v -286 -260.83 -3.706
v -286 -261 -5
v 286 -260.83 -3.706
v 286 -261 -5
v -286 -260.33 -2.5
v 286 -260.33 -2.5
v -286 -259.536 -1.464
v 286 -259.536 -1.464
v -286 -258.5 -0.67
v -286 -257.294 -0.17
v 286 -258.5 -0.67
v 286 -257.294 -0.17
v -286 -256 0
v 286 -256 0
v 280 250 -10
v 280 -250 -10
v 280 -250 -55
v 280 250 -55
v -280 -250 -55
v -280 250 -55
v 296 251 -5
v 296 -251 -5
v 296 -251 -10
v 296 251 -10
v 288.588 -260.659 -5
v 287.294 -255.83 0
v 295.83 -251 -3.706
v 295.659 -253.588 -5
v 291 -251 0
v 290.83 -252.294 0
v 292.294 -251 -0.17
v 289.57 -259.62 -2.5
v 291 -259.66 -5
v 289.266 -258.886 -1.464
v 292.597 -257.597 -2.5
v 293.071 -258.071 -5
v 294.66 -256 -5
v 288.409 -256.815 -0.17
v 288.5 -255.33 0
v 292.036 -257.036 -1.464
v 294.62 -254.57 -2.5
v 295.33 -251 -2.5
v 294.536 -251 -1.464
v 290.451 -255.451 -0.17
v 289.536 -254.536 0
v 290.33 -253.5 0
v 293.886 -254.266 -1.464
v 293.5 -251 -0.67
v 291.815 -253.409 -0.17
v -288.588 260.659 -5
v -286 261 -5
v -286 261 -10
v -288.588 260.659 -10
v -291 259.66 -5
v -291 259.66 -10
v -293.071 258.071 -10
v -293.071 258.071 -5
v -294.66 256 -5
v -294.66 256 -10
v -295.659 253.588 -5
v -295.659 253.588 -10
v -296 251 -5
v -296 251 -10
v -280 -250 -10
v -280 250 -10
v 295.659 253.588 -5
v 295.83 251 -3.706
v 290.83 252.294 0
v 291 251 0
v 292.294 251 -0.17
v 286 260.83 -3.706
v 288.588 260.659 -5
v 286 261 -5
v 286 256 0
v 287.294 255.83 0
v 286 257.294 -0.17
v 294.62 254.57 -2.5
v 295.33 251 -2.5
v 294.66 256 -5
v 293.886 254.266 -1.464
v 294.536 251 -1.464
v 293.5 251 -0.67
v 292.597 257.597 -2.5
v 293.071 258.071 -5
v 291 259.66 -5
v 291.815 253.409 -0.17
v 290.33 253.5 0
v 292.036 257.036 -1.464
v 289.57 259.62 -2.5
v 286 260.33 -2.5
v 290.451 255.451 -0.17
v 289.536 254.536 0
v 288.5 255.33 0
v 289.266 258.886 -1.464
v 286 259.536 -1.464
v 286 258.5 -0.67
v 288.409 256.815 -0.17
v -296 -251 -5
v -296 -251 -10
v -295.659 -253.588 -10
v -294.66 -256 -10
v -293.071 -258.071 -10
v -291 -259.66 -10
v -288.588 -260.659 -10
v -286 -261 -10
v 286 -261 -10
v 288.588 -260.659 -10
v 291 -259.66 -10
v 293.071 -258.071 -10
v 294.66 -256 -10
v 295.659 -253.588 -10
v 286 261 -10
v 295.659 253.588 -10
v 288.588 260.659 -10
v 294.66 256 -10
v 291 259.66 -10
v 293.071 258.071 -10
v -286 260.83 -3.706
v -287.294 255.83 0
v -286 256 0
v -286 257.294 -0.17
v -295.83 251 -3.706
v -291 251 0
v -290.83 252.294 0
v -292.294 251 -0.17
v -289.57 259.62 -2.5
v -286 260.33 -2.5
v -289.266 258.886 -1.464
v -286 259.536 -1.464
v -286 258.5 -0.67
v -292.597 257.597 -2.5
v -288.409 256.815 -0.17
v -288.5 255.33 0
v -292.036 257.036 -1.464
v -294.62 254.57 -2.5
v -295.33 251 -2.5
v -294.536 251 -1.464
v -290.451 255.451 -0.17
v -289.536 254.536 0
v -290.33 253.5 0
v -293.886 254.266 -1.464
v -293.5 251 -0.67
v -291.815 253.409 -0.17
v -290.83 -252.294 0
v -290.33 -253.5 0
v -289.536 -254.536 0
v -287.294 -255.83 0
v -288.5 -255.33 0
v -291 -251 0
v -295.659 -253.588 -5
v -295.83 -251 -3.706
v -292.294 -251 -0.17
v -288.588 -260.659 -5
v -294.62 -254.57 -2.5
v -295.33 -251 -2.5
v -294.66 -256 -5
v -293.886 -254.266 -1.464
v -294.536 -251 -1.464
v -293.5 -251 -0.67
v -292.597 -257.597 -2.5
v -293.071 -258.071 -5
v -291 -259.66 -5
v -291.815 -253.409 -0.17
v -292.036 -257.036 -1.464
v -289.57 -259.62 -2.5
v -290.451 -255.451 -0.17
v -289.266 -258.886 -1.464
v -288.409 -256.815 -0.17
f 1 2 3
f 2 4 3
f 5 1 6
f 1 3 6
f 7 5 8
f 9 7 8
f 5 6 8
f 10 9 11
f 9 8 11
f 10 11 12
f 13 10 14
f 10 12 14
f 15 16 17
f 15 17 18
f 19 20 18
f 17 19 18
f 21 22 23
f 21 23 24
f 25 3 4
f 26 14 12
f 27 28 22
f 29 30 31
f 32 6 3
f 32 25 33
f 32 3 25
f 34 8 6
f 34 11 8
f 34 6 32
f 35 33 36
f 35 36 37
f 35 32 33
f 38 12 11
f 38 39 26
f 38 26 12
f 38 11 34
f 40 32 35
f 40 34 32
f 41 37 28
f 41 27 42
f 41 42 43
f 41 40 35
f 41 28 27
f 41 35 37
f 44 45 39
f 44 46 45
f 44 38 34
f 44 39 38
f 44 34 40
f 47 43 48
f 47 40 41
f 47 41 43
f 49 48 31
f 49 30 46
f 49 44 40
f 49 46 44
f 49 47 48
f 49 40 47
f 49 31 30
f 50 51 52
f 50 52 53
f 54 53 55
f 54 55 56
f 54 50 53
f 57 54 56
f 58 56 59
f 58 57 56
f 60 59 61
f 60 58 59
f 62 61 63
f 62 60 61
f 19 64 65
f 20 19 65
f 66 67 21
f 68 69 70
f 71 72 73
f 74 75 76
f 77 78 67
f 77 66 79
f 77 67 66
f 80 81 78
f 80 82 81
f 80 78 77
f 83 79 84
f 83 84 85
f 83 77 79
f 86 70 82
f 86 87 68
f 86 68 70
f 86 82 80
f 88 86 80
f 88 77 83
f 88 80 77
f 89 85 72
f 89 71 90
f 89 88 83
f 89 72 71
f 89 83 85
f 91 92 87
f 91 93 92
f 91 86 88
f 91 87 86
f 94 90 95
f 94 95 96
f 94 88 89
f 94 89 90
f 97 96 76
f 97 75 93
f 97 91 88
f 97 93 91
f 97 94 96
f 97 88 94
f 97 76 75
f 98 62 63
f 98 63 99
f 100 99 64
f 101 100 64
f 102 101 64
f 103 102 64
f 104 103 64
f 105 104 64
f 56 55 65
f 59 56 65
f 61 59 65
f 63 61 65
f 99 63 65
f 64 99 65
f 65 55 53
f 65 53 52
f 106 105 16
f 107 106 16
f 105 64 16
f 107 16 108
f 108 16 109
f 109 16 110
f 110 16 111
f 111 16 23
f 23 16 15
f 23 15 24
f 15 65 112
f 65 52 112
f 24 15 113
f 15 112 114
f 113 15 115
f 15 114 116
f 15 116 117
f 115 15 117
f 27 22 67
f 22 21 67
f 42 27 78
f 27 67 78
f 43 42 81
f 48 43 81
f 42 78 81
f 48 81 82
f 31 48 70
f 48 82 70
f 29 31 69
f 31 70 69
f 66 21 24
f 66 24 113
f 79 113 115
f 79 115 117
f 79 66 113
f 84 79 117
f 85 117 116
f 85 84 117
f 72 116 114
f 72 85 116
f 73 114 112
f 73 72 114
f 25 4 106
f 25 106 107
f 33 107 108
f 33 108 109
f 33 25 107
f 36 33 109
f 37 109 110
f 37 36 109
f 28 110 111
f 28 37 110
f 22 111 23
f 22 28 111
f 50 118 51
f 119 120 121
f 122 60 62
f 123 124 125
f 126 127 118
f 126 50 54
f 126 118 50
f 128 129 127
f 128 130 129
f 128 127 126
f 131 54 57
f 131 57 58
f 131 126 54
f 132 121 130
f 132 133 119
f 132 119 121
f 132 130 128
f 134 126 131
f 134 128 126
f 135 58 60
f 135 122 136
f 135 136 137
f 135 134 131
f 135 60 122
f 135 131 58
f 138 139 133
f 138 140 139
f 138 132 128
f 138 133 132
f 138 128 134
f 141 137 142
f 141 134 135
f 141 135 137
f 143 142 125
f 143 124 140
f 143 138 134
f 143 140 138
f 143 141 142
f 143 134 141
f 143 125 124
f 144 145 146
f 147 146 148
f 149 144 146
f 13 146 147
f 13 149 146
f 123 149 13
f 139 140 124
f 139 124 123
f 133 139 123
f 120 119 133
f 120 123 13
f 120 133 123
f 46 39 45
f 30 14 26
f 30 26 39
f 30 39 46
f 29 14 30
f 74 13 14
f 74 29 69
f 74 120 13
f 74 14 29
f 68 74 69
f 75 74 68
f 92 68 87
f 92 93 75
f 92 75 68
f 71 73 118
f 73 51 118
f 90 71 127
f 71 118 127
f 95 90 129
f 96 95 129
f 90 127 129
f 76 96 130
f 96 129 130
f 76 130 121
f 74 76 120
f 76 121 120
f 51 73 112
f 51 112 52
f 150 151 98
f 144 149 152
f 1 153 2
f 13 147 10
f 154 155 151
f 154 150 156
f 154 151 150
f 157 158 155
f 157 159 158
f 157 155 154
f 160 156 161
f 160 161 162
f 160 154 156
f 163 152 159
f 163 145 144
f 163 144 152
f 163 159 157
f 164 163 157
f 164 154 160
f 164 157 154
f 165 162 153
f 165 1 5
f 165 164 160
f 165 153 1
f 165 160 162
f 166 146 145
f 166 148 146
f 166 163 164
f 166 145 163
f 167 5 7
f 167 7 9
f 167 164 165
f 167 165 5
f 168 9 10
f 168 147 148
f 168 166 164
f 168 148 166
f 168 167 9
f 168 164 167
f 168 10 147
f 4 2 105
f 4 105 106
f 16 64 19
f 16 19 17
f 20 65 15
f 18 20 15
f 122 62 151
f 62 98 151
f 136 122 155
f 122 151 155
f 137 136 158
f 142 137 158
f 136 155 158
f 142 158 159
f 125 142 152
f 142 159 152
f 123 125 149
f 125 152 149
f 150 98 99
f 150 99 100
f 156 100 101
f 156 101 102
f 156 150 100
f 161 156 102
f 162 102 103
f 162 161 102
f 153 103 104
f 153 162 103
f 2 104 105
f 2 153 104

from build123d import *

# Parameters (mm, degrees)
F0_W     = 560
F0_H     = 500
F1_DEPTH = 55
F2_DEPTH = 10
F3_R     = 5


with BuildPart() as f1:
    # F0 (on Top) → F1 (new body)
    with BuildSketch(Plane.XY):
        Rectangle(F0_W, F0_H)
    extrude(amount=-F1_DEPTH)

    # F0 (on Top) → F2 (join)
    with BuildSketch(Plane.XY):
        with BuildLine():
            Line((286, 261), (-286, 261))
            ThreePointArc((-286, 261), (-293.071068, 258.071068), (-296, 251))
            Line((-296, 251), (-296, -251))
            ThreePointArc((-296, -251), (-293.071068, -258.071068), (-286, -261))
            Line((-286, -261), (286, -261))
            ThreePointArc((286, -261), (293.071068, -258.071068), (296, -251))
            Line((296, -251), (296, 251))
            ThreePointArc((296, 251), (293.071068, 258.071068), (286, 261))
        make_face()
        Rectangle(F0_W, F0_H, mode=Mode.SUBTRACT)
        Rectangle(F0_W, F0_H)
    extrude(amount=-F2_DEPTH)

    # F3
    f3_edges = [f1.edges().sort_by_distance(p)[0] for p in [
        (0, 261, 0),
        (-293.071068, 258.071068, 0),
        (-296, 0, 0),
        (-293.071068, -258.071068, 0),
        (0, -261, 0),
        (293.071068, -258.071068, 0),
        (296, 0, 0),
        (293.071068, 258.071068, 0),
    ]]
    fillet(f3_edges, radius=F3_R)


solid = f1.part
